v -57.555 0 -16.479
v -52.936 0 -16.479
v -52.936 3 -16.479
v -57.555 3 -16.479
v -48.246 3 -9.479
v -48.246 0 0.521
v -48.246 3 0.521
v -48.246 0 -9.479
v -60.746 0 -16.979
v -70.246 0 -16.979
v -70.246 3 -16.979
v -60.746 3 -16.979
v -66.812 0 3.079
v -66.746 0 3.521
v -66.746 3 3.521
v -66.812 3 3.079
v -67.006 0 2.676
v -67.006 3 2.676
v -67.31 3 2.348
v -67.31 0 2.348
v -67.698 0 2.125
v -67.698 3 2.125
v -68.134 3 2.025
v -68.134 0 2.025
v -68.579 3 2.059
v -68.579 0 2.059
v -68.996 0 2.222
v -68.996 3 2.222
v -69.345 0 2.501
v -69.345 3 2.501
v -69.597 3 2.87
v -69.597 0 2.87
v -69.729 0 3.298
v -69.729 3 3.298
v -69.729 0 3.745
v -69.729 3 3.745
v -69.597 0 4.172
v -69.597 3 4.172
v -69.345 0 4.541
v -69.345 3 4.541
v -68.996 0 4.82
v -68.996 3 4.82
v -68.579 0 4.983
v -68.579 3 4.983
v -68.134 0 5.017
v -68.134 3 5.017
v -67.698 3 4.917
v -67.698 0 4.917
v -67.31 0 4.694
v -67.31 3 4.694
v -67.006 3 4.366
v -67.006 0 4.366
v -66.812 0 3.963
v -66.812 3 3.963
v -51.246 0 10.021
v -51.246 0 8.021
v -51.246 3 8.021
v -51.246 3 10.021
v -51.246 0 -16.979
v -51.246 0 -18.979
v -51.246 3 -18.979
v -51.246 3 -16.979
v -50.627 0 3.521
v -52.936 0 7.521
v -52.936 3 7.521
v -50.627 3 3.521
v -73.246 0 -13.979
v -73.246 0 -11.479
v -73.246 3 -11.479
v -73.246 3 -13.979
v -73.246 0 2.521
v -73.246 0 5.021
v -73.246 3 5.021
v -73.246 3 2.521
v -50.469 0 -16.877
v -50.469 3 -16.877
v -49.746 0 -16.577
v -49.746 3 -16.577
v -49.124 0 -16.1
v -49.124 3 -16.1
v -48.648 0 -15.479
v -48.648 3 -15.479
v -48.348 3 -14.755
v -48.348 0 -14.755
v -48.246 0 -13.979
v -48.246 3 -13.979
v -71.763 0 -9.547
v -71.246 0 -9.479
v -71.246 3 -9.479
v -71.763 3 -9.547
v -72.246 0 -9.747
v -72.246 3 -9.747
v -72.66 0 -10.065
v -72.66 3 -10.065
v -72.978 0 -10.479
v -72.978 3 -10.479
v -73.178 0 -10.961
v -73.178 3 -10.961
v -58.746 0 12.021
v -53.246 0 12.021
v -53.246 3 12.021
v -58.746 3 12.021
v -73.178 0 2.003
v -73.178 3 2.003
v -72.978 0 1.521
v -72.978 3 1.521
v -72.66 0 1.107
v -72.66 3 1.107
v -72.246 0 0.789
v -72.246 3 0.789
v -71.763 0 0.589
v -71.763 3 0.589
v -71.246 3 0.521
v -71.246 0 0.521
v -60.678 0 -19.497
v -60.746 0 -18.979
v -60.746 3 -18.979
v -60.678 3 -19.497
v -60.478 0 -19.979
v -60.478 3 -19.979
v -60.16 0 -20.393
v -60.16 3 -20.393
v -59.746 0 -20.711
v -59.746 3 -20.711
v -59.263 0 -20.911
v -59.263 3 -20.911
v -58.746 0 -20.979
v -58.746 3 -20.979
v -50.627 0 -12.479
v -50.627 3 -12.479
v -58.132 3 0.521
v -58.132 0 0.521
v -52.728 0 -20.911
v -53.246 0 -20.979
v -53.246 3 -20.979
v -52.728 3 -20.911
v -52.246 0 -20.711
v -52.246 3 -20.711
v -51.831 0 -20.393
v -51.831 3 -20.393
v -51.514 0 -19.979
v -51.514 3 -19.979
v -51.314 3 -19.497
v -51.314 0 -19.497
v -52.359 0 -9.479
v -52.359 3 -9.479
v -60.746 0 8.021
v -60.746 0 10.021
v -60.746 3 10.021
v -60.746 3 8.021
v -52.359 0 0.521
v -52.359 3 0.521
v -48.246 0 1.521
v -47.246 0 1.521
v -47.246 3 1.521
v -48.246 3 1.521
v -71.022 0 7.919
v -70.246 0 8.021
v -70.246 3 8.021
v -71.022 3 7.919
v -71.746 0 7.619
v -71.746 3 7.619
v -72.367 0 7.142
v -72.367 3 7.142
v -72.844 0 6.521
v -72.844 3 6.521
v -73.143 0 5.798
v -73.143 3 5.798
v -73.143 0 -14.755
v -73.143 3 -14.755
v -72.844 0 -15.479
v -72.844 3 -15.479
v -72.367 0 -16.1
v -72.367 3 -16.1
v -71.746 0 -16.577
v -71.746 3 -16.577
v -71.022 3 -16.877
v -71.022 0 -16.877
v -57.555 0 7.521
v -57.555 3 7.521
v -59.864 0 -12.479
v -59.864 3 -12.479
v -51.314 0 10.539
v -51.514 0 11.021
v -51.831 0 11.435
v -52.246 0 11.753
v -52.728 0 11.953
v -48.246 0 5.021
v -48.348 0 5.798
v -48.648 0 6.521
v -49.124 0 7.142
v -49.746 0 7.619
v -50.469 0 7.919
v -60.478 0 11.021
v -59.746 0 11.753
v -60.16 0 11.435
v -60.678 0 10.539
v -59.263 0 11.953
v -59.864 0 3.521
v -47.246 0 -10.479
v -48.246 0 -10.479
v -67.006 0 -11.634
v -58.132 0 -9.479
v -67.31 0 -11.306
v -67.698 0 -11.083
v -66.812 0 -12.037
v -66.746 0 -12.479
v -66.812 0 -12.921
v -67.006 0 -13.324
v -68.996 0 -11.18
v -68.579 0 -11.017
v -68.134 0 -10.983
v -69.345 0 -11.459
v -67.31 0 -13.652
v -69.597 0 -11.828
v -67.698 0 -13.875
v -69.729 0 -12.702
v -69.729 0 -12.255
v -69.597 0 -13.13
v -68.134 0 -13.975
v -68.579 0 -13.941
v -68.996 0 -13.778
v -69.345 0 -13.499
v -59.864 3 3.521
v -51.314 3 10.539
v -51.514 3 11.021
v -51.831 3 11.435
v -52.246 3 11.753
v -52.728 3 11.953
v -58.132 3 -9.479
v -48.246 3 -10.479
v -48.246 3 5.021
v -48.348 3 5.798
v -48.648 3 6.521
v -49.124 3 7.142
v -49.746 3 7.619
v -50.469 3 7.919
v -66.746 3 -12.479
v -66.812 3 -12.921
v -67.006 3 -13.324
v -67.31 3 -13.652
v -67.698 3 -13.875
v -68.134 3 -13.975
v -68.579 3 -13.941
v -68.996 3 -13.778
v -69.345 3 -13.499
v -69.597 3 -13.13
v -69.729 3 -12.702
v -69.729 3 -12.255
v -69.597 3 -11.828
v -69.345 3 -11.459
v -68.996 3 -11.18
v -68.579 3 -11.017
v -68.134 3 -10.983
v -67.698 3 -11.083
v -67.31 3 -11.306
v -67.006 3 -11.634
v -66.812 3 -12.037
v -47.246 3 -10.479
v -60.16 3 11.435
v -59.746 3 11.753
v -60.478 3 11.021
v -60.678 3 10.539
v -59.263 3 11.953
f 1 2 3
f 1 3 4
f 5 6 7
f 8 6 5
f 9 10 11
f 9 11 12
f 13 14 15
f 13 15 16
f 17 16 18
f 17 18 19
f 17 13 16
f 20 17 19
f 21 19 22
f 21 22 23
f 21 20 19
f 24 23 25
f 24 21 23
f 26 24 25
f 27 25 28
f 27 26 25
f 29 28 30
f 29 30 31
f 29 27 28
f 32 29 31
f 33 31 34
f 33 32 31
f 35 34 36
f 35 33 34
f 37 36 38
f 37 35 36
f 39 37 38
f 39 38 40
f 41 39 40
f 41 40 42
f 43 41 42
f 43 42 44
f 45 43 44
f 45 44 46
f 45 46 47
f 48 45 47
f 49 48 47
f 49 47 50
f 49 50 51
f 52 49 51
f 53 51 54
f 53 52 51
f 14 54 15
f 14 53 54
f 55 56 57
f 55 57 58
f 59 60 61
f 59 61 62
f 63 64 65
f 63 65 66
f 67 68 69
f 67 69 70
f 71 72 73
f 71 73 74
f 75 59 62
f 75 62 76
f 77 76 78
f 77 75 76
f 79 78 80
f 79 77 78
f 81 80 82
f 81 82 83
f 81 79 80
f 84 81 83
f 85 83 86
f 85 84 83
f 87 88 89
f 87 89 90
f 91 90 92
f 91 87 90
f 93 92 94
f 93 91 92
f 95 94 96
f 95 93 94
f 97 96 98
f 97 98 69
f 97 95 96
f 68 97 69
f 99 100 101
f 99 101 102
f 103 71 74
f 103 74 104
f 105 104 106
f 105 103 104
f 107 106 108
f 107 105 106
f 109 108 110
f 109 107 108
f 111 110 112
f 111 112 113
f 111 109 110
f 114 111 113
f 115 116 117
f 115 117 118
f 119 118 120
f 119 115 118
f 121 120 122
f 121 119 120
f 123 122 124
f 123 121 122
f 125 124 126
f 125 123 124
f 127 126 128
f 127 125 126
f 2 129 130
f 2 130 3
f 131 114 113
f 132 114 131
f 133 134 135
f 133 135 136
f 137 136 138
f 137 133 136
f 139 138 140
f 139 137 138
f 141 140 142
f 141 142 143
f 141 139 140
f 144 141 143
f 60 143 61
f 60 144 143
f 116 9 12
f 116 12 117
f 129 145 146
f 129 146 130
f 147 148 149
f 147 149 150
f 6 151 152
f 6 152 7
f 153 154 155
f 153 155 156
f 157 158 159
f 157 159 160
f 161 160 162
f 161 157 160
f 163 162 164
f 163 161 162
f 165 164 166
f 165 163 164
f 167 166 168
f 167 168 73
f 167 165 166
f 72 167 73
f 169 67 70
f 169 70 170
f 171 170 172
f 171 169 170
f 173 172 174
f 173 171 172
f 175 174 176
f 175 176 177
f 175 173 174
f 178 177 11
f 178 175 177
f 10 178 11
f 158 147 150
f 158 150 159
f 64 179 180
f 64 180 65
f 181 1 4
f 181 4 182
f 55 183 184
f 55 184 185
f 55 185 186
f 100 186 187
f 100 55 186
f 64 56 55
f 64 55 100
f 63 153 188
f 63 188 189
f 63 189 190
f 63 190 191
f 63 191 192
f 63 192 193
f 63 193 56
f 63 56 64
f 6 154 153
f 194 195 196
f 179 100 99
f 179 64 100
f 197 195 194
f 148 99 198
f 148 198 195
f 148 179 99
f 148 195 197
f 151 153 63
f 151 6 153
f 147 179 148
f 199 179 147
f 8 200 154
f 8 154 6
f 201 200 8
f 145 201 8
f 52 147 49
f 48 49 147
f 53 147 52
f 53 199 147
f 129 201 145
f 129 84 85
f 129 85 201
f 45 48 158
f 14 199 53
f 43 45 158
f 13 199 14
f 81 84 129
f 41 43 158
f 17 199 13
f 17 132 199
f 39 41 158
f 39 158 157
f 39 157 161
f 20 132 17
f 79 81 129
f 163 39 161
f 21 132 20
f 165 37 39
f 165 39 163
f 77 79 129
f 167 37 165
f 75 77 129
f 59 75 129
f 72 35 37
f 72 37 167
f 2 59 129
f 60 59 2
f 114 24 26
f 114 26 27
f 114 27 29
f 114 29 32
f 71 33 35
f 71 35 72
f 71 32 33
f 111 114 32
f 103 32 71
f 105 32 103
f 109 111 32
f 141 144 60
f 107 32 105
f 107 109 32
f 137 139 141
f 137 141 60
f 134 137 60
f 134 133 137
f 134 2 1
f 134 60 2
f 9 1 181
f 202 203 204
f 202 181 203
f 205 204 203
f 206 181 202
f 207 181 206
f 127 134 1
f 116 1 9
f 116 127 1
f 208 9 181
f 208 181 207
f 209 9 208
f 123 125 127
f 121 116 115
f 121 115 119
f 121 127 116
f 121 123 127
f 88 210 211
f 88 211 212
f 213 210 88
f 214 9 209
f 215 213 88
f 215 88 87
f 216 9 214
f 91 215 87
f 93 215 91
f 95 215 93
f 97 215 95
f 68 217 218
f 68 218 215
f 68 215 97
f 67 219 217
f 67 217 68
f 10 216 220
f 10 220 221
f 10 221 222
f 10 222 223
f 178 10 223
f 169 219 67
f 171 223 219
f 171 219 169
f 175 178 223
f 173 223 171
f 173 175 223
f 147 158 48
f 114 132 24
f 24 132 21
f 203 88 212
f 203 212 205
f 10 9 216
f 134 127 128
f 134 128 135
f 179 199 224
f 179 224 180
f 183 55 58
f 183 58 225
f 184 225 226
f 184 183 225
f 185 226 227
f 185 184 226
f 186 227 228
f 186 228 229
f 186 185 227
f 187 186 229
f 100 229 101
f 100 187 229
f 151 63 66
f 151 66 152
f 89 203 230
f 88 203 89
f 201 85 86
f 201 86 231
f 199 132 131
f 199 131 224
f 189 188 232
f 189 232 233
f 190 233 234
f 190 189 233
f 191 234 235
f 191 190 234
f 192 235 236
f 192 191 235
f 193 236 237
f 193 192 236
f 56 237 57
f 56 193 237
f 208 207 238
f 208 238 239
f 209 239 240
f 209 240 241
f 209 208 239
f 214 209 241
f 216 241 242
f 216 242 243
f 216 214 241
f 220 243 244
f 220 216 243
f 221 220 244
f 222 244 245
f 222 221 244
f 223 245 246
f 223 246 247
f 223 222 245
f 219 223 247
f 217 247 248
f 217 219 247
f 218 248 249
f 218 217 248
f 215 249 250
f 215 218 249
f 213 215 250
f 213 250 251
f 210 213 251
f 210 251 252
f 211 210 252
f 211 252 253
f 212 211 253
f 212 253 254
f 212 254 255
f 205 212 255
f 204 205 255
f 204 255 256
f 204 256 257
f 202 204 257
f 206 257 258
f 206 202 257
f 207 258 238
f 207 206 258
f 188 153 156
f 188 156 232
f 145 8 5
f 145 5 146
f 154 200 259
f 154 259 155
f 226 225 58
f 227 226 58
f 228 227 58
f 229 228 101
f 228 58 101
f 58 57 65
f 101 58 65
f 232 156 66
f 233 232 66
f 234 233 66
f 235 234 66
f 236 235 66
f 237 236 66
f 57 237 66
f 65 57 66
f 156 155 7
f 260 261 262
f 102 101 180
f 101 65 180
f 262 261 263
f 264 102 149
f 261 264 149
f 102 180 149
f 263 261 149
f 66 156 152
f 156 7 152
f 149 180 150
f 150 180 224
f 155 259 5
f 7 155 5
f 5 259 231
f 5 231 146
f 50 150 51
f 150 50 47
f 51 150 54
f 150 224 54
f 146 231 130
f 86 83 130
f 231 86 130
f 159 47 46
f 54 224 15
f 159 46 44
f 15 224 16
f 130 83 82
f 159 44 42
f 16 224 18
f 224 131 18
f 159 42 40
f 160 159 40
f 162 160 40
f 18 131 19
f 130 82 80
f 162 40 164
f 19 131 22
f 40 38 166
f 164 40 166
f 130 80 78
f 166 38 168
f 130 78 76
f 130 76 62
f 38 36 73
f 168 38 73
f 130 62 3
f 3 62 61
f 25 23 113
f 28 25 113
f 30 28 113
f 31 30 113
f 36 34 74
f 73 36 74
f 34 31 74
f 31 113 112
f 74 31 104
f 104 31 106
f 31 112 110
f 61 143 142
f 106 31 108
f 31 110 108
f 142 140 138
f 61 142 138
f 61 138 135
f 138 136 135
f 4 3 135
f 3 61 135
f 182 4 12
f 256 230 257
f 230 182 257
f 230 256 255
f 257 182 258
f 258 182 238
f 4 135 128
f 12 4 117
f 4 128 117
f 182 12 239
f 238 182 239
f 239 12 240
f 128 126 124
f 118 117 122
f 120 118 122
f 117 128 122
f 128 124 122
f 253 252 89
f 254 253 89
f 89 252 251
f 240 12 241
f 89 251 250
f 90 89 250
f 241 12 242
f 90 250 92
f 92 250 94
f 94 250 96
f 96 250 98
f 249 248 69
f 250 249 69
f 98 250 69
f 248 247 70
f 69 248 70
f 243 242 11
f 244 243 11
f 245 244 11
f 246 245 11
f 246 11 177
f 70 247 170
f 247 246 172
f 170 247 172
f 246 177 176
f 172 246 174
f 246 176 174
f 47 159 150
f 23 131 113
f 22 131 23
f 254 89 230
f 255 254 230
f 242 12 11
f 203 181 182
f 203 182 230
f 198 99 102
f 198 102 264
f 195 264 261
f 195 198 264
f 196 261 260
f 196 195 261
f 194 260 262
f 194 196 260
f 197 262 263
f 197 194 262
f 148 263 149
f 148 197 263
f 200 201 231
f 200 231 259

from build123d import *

# Parameters (mm, degrees)
SKETCH3_R           = 1.5
BOSS_EXTRUDE1_DEPTH = 3


with BuildPart() as part:
    # Sketch3 → Boss-Extrude1 (new body)
    with BuildSketch(Plane(origin=(0, 0, 0), x_dir=(1, 0, 0), z_dir=(0, 1, 0))):
        with BuildLine():
            Line((-60.745672261, 16.978901462), (-60.745672261, 18.978901462))
            ThreePointArc((-60.745672261, 18.978901462), (-60.159885823, 20.393115024), (-58.745672261, 20.978901462))
            Line((-58.745672261, 20.978901462), (-53.245672261, 20.978901462))
            ThreePointArc((-53.245672261, 20.978901462), (-51.831458698, 20.393115024), (-51.245672261, 18.978901462))
            Line((-51.245672261, 18.978901462), (-51.245672261, 16.978901462))
            ThreePointArc((-51.245672261, 16.978901462), (-49.124351917, 16.100221806), (-48.245672261, 13.978901462))
            Line((-48.245672261, 13.978901462), (-48.245672261, 10.478901462))
            Line((-48.245672261, 10.478901462), (-47.245672261, 10.478901462))
            Line((-47.245672261, 10.478901462), (-47.245672261, -1.521098538))
            Line((-47.245672261, -1.521098538), (-48.245672261, -1.521098538))
            Line((-48.245672261, -1.521098538), (-48.245672261, -5.021098538))
            ThreePointArc((-48.245672261, -5.021098538), (-49.124351917, -7.142418882), (-51.245672261, -8.021098538))
            Line((-51.245672261, -8.021098538), (-51.245672261, -10.021098538))
            ThreePointArc((-51.245672261, -10.021098538), (-51.831458698, -11.4353121), (-53.245672261, -12.021098538))
            Line((-53.245672261, -12.021098538), (-58.745672261, -12.021098538))
            ThreePointArc((-58.745672261, -12.021098538), (-60.159885823, -11.4353121), (-60.745672261, -10.021098538))
            Line((-60.745672261, -10.021098538), (-60.745672261, -8.021098538))
            Line((-60.745672261, -8.021098538), (-70.245672261, -8.021098538))
            ThreePointArc((-70.245672261, -8.021098538), (-72.366992604, -7.142418882), (-73.245672261, -5.021098538))
            Line((-73.245672261, -5.021098538), (-73.245672261, -2.521098538))
            ThreePointArc((-73.245672261, -2.521098538), (-72.659885823, -1.106884976), (-71.245672261, -0.521098538))
            Line((-71.245672261, -0.521098538), (-58.132423607, -0.521098538))
            Line((-58.132423607, -0.521098538), (-59.864474414, -3.521098538))
            Line((-59.864474414, -3.521098538), (-57.555073337, -7.521098538))
            Line((-57.555073337, -7.521098538), (-52.936271184, -7.521098538))
            Line((-52.936271184, -7.521098538), (-50.626870107, -3.521098538))
            Line((-50.626870107, -3.521098538), (-52.358920915, -0.521098538))
            Line((-52.358920915, -0.521098538), (-48.245672261, -0.521098538))
            Line((-48.245672261, -0.521098538), (-48.245672261, 9.478901462))
            Line((-48.245672261, 9.478901462), (-52.358920915, 9.478901462))
            Line((-52.358920915, 9.478901462), (-50.626870107, 12.478901462))
            Line((-50.626870107, 12.478901462), (-52.936271184, 16.478901462))
            Line((-52.936271184, 16.478901462), (-57.555073337, 16.478901462))
            Line((-57.555073337, 16.478901462), (-59.864474414, 12.478901462))
            Line((-59.864474414, 12.478901462), (-58.132423607, 9.478901462))
            Line((-58.132423607, 9.478901462), (-71.245672261, 9.478901462))
            ThreePointArc((-71.245672261, 9.478901462), (-72.659885823, 10.0646879), (-73.245672261, 11.478901462))
            Line((-73.245672261, 11.478901462), (-73.245672261, 13.978901462))
            ThreePointArc((-73.245672261, 13.978901462), (-72.366992604, 16.100221806), (-70.245672261, 16.978901462))
            Line((-70.245672261, 16.978901462), (-60.745672261, 16.978901462))
        make_face()
        with Locations((-68.245672261, -3.521098538)):
            Circle(SKETCH3_R, mode=Mode.SUBTRACT)
        with Locations((-68.245672261, 12.478901462)):
            Circle(SKETCH3_R, mode=Mode.SUBTRACT)
    extrude(amount=BOSS_EXTRUDE1_DEPTH)


solid = part.part
